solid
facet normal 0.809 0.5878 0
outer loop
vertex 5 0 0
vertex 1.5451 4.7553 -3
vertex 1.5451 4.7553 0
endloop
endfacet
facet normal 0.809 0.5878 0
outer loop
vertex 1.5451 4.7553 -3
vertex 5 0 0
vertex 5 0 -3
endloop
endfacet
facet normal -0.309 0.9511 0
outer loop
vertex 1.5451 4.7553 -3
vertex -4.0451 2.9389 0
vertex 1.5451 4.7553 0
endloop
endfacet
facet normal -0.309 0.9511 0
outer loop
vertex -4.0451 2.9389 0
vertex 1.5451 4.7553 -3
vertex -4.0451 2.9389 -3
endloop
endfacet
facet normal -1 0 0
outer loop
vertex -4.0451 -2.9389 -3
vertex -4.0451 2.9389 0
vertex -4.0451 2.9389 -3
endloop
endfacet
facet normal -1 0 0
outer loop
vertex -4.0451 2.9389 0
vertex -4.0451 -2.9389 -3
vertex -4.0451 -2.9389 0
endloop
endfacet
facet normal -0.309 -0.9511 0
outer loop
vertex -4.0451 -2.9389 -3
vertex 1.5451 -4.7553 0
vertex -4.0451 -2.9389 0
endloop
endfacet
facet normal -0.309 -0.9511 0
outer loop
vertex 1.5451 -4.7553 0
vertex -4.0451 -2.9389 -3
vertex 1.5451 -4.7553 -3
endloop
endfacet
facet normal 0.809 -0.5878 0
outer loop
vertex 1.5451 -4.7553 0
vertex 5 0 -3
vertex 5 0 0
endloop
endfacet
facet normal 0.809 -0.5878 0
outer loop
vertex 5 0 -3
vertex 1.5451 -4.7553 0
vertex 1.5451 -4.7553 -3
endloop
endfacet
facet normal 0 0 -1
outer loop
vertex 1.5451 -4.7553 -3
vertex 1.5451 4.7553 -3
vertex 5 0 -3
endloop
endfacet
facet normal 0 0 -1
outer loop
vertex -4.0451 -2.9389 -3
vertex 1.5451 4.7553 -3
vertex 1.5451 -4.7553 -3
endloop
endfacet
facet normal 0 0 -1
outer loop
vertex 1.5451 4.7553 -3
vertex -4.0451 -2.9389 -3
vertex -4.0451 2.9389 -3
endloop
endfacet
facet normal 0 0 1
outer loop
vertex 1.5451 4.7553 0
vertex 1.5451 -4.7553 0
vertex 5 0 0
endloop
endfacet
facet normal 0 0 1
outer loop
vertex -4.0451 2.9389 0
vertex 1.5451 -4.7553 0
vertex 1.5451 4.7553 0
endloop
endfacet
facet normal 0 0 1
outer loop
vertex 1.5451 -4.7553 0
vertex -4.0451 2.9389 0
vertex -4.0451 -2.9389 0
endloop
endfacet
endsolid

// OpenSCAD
$fn=5;
translate([0,0,-3])
{
	rotate(0,[0,0,1])
	{
		cylinder(h=3,d=10);
	}
}
